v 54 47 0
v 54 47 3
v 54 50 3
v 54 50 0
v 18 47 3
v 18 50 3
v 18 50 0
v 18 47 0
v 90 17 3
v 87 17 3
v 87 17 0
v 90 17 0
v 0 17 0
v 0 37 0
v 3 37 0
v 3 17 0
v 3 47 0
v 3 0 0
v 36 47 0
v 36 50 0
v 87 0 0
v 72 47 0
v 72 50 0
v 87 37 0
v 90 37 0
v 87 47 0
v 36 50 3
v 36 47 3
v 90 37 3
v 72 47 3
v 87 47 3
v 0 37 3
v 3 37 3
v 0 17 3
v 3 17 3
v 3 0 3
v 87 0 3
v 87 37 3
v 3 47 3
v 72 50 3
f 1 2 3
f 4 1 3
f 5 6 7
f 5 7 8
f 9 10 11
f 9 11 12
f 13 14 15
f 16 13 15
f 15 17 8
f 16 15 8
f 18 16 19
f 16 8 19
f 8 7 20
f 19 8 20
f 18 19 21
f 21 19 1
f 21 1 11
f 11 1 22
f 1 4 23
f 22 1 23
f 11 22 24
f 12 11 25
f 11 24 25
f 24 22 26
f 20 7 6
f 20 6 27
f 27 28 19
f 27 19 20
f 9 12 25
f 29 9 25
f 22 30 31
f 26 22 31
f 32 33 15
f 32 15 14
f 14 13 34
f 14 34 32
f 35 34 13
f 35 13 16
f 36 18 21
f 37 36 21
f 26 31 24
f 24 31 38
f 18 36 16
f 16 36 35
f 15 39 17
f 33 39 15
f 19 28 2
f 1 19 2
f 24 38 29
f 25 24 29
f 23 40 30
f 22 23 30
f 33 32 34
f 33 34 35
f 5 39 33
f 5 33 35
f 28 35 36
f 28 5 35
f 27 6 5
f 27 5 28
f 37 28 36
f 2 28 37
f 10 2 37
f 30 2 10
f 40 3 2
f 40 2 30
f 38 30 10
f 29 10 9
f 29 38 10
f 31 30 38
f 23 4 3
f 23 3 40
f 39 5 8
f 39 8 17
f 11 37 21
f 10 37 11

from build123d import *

# Parameters (mm, degrees)
SKETCH1_W           = 90
SKETCH1_H           = 50
BOSS_EXTRUDE1_DEPTH = 3
SKETCH2_W           = 18
SKETCH2_H           = 3
SKETCH2_W_2         = 3
SKETCH2_H_2         = 17
CUT_EXTRUDE1_DEPTH  = 3


with BuildPart() as part:
    # Sketch1 → Boss-Extrude1 (new body)
    with BuildSketch(Plane.XY):
        with Locations((45, 25)):
            Rectangle(SKETCH1_W, SKETCH1_H)
    extrude(amount=BOSS_EXTRUDE1_DEPTH)

    # Sketch2 → Cut-Extrude1 (cut)
    with BuildSketch(Plane.XY.offset(3)):
        Polygon((0, 50), (18, 50), (18, 47), (3, 47), (3, 37), (0, 37), (0, 47), align=None)
        with Locations((45, 48.5)):
            Rectangle(SKETCH2_W, SKETCH2_H)
        Polygon((90, 50), (72, 50), (72, 47), (87, 47), (87, 37), (90, 37), (90, 47), align=None)
        with Locations((88.5, 8.5)):
            Rectangle(SKETCH2_W_2, SKETCH2_H_2)
        with Locations((1.5, 8.5)):
            Rectangle(SKETCH2_W_2, SKETCH2_H_2)
    extrude(amount=-CUT_EXTRUDE1_DEPTH, mode=Mode.SUBTRACT)


solid = part.part
